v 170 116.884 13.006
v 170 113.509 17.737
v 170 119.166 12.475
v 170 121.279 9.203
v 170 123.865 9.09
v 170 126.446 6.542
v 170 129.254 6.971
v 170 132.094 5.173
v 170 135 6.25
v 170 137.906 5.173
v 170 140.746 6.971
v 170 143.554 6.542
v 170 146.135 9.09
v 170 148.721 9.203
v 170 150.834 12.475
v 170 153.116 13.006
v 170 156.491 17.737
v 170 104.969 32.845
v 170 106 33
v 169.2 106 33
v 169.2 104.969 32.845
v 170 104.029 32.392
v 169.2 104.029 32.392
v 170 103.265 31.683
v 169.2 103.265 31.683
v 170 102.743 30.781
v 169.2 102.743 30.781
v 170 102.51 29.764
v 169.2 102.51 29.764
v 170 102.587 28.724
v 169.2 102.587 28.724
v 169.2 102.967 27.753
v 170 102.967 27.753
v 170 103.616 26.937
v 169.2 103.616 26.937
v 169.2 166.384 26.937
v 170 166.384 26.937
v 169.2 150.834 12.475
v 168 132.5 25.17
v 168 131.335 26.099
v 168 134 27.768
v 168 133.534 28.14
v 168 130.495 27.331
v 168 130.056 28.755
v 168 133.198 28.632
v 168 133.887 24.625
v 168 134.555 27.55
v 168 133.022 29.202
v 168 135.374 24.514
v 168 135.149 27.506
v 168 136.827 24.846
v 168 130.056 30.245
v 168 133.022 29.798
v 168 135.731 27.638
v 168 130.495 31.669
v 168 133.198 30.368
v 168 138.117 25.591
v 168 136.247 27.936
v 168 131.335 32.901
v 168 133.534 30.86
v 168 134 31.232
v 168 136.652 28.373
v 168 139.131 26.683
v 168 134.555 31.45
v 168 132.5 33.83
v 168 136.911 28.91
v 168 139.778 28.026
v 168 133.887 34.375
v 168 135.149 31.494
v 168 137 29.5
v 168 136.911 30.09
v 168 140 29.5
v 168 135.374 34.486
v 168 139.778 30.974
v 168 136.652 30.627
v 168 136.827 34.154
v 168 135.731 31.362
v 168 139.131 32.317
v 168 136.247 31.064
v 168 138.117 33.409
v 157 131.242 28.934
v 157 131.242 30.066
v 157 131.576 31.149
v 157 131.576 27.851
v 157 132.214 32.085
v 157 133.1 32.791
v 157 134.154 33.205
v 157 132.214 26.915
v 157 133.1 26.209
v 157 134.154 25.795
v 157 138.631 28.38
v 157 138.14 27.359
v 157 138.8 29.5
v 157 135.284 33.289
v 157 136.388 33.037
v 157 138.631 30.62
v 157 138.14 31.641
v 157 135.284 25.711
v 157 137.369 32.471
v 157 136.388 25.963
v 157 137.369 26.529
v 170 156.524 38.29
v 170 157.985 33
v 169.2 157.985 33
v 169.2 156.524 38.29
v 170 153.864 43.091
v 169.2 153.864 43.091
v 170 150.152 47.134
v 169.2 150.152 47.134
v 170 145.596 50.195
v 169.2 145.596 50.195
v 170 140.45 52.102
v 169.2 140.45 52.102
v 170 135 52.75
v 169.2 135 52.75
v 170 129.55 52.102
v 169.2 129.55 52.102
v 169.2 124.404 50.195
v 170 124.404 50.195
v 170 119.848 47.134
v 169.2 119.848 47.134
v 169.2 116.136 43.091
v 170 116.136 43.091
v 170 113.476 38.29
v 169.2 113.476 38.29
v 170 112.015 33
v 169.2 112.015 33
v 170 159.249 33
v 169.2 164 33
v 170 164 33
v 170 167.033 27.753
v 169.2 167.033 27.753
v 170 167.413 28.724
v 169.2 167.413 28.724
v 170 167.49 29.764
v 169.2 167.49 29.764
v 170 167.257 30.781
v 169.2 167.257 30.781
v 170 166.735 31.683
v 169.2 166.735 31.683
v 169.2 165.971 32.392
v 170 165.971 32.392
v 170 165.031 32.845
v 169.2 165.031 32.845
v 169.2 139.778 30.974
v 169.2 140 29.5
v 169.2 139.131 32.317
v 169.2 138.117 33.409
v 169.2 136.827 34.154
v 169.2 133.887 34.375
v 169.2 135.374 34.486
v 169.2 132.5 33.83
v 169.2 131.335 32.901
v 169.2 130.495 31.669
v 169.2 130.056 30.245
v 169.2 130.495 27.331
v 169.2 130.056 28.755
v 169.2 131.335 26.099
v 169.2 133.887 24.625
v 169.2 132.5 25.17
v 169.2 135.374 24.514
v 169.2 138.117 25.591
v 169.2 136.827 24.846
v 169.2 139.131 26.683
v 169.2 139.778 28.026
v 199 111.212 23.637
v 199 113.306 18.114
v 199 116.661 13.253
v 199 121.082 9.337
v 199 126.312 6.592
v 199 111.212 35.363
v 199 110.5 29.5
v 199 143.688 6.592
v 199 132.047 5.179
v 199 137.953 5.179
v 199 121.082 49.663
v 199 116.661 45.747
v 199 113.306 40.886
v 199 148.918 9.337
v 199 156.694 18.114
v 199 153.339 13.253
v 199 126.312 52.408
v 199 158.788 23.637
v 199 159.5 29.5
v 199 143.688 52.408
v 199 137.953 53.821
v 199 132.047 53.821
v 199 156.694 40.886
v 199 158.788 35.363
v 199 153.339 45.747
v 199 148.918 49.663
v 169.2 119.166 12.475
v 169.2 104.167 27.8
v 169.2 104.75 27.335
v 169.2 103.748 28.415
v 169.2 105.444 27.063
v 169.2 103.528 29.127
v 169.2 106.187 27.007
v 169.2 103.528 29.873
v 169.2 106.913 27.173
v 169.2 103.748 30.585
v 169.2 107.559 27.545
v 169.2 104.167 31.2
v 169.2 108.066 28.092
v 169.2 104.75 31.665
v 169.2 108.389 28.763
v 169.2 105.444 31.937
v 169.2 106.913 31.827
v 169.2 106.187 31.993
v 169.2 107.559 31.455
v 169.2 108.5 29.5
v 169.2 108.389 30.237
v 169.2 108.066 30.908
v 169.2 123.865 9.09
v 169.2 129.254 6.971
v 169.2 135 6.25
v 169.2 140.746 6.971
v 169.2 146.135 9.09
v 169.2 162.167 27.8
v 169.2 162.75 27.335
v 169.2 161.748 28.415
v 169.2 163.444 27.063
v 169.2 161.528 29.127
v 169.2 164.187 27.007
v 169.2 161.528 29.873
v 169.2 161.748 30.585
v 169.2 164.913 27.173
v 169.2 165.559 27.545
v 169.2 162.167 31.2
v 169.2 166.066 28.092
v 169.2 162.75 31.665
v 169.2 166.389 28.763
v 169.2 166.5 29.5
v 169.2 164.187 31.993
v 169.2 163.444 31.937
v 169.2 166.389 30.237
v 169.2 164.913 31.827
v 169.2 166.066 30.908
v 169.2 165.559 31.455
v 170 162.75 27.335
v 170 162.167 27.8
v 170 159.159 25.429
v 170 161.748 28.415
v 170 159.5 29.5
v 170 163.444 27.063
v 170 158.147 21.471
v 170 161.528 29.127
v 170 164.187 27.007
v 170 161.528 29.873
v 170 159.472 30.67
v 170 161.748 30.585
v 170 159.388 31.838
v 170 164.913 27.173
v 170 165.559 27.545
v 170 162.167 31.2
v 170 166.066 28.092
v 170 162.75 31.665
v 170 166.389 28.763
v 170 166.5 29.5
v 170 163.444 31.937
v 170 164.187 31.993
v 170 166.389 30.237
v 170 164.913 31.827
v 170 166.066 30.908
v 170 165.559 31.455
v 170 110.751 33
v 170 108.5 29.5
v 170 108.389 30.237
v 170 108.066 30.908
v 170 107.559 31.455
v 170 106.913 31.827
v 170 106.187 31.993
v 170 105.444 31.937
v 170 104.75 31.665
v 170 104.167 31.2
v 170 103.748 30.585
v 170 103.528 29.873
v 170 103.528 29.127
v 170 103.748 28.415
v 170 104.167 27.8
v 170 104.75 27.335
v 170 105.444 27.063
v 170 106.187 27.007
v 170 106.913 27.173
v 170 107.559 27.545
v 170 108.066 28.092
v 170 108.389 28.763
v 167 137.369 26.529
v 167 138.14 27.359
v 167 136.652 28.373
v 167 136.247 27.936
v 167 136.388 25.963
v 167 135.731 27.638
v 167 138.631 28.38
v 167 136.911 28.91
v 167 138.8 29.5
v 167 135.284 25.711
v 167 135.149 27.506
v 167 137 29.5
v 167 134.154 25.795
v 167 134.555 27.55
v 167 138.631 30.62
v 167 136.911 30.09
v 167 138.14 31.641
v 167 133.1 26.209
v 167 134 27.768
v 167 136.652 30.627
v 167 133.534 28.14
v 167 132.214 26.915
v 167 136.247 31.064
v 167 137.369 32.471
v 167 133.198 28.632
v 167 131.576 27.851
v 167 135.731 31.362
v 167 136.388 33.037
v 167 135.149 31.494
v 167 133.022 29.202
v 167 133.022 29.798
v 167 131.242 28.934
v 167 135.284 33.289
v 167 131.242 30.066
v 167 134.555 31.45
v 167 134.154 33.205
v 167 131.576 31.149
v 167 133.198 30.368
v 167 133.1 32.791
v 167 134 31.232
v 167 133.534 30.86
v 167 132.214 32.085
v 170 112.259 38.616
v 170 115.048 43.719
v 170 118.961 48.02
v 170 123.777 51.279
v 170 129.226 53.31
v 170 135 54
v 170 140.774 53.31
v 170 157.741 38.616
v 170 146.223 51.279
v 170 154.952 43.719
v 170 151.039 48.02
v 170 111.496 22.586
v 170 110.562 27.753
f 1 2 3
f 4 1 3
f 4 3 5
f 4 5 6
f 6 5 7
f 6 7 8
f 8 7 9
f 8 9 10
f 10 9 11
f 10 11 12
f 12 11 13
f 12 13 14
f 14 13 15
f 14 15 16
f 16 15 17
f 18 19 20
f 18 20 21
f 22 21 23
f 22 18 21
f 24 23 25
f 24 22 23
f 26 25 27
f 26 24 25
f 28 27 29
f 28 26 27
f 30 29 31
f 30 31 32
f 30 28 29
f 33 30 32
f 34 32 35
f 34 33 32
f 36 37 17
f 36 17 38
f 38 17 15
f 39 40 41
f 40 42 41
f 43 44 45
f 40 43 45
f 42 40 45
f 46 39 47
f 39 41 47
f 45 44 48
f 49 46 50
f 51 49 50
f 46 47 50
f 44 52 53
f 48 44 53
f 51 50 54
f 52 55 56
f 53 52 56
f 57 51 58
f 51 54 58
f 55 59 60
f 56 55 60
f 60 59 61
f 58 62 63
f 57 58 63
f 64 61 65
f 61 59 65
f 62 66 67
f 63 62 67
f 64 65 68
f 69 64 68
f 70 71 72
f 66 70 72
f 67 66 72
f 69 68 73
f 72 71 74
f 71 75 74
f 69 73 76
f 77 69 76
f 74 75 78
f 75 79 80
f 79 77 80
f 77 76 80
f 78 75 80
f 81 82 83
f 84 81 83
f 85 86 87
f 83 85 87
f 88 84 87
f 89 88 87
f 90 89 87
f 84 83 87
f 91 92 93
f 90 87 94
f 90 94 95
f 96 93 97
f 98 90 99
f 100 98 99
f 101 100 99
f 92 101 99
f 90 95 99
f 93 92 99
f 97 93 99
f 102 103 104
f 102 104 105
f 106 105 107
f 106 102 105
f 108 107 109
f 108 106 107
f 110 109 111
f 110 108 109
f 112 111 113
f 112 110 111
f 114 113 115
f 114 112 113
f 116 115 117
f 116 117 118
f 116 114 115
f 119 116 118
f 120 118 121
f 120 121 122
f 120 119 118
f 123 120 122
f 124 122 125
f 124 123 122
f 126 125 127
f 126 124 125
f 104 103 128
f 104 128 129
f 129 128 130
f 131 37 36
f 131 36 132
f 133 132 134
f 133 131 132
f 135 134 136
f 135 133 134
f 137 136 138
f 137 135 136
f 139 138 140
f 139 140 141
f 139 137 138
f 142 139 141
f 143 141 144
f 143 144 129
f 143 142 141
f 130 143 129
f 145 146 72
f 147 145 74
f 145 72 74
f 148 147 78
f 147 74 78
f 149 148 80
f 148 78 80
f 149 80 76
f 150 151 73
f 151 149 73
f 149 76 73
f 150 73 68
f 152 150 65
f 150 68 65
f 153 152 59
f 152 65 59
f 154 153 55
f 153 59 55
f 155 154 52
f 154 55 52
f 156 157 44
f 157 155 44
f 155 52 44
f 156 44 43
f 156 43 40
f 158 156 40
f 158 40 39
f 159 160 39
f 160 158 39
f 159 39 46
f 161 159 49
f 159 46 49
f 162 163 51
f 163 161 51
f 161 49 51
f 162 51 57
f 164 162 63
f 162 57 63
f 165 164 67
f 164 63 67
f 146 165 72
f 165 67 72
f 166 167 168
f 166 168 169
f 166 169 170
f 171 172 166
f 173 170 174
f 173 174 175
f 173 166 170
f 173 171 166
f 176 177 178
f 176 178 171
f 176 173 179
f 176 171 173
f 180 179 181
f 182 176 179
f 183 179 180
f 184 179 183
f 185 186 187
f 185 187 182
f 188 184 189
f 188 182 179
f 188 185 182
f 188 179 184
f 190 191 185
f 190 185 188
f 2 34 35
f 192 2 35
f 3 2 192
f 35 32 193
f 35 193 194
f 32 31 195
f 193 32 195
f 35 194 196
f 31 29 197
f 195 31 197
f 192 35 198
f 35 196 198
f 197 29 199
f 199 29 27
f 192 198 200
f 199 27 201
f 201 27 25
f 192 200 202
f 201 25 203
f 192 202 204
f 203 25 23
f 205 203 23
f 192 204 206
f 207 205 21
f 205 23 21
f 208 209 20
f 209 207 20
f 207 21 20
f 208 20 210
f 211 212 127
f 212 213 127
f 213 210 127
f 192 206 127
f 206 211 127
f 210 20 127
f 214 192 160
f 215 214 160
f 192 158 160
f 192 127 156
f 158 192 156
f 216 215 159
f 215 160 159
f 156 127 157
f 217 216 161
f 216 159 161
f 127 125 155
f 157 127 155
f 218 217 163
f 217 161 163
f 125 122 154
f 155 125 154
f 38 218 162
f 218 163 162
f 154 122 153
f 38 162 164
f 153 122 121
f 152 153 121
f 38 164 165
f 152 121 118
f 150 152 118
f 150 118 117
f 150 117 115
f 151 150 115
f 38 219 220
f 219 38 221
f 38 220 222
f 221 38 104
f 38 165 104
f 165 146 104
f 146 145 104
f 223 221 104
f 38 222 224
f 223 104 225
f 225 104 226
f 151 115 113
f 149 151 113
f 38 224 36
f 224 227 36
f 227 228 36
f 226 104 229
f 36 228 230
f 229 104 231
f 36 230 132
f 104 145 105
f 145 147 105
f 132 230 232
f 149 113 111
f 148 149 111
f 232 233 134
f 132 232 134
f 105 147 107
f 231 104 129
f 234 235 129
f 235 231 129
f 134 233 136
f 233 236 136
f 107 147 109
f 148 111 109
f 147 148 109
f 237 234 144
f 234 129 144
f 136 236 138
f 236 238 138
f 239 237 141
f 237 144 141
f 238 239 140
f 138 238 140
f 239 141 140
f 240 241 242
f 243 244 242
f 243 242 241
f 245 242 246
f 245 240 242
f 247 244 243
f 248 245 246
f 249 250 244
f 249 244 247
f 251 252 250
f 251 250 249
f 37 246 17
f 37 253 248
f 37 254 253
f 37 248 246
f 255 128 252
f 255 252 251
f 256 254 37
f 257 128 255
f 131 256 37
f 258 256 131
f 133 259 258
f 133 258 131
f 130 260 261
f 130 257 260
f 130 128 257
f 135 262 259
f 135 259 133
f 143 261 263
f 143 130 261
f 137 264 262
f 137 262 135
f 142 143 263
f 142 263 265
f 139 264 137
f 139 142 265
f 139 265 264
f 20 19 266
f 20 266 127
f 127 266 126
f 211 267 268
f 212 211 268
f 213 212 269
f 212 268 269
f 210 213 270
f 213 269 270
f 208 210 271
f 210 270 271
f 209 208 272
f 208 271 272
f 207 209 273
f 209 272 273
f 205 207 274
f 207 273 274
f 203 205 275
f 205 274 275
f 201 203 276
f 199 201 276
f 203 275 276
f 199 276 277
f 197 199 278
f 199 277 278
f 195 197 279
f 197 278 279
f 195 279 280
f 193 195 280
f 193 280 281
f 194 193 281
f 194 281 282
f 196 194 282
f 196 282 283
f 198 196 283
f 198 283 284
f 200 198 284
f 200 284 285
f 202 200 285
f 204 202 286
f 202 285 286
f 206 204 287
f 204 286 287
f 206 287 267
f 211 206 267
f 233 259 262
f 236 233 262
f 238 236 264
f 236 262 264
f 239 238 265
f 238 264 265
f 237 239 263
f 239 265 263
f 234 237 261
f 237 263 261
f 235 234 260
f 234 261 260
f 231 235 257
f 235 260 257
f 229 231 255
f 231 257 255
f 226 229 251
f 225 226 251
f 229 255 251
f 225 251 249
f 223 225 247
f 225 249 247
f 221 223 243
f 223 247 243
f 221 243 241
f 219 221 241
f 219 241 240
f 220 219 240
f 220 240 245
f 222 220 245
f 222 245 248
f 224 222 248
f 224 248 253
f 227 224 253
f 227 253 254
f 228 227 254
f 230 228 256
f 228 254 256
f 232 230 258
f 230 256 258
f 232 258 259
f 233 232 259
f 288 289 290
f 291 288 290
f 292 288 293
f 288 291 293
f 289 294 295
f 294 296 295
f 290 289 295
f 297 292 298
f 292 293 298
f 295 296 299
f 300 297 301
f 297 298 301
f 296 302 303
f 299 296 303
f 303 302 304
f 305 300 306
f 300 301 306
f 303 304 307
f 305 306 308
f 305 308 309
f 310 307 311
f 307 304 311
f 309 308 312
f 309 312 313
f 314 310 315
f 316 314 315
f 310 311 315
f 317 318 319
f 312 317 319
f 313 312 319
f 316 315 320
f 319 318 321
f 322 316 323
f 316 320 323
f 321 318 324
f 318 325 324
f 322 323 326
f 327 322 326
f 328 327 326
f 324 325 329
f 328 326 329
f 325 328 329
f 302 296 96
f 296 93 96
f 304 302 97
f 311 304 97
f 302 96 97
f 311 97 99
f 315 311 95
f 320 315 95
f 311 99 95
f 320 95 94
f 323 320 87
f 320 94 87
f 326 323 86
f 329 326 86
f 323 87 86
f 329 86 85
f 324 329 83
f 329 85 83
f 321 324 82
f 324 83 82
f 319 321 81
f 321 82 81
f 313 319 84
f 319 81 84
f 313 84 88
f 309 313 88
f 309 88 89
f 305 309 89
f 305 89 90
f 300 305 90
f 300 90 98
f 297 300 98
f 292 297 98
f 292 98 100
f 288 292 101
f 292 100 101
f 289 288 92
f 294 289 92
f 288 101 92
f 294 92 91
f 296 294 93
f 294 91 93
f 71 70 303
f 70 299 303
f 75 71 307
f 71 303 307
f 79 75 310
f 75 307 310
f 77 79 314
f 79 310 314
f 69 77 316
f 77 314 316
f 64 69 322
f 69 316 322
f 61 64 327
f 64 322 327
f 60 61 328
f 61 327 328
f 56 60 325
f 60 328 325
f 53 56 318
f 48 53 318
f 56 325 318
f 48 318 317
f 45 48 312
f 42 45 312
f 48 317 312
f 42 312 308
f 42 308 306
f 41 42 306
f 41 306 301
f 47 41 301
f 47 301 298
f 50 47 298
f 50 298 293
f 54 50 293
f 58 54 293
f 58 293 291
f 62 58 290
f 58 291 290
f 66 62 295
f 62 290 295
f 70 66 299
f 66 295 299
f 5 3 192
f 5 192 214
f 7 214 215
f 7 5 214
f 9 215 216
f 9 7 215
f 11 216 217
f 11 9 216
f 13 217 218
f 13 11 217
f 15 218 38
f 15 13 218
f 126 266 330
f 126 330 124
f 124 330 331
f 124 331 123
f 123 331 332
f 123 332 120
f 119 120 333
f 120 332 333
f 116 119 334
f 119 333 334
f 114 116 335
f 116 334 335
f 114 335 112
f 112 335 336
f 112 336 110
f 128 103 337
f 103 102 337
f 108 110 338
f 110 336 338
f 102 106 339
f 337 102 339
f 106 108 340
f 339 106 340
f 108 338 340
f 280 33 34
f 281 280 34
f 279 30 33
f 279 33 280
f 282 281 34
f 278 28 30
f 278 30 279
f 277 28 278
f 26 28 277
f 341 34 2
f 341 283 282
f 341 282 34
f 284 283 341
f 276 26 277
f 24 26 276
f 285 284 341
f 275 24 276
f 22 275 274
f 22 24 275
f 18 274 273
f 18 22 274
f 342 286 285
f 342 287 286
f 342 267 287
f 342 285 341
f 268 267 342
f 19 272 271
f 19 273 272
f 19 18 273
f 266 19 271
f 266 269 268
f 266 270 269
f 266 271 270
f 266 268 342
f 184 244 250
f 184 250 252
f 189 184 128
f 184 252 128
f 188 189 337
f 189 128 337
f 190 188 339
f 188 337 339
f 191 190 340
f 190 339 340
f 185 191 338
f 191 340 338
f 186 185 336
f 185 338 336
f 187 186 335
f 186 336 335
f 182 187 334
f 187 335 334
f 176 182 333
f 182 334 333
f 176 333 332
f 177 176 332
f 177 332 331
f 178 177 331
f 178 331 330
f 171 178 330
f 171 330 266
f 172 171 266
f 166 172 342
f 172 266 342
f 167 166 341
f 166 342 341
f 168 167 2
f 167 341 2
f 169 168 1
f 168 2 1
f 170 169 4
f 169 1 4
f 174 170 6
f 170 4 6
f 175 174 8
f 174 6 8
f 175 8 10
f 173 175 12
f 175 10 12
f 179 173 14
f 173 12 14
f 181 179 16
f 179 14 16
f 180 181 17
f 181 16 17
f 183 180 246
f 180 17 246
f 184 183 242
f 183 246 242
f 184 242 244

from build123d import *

# Parameters (mm, degrees)
SKETCH009_R  = 24.5
PAD004_DEPTH = 29
SKETCH011_R  = 2.5
PAD005_DEPTH = 0.8


with BuildPart() as part:
    # Sketch009 → Pad004 (new body)
    with BuildSketch(Plane.YZ):
        Circle(SKETCH009_R)
    extrude(amount=PAD004_DEPTH)

    # Sketch010 → Revolution002 (revolve)
    with BuildSketch(Plane.XY):
        Polygon((-2, 5), (-2, 2), (-3, 2), (-3, 3.8), (-13, 3.8), (-13, 0), (0, 0), (0, 5), align=None)
    revolve(axis=Axis((0, 0, 0), (1, 0, 0)))

    # Sketch011 → Pad005 (join)
    with BuildSketch(Plane.YZ):
        with BuildLine():
            ThreePointArc((-28.999999, 3.5), (-32.257305, 1.28061), (-31.383621, -2.56288))
            Line((-31.383621, -2.56288), (-15.834049, -17.024847))
            ThreePointArc((-15.834049, -17.024847), (2e-06, -23.25), (15.834052, -17.024844))
            Line((31.383621, -2.56288), (15.834052, -17.024844))
            ThreePointArc((31.383621, -2.56288), (32.257306, 1.280609), (29, 3.5))
            Line((22.985049, 3.5), (29, 3.5))
            ThreePointArc((22.985049, 3.5), (0, 23.25), (-22.985049, 3.5))
            Line((-28.999999, 3.5), (-22.985049, 3.5))
        make_face()
        with Locations((-29, 0)):
            Circle(SKETCH011_R, mode=Mode.SUBTRACT)
        with Locations((29, 0)):
            Circle(SKETCH011_R, mode=Mode.SUBTRACT)
    extrude(amount=-PAD005_DEPTH)


with BuildPart() as part_1:
    # Body005 placement: moved
    add(part.part.moved(Location((170, 135, 29.5))))


solid = part_1.part
